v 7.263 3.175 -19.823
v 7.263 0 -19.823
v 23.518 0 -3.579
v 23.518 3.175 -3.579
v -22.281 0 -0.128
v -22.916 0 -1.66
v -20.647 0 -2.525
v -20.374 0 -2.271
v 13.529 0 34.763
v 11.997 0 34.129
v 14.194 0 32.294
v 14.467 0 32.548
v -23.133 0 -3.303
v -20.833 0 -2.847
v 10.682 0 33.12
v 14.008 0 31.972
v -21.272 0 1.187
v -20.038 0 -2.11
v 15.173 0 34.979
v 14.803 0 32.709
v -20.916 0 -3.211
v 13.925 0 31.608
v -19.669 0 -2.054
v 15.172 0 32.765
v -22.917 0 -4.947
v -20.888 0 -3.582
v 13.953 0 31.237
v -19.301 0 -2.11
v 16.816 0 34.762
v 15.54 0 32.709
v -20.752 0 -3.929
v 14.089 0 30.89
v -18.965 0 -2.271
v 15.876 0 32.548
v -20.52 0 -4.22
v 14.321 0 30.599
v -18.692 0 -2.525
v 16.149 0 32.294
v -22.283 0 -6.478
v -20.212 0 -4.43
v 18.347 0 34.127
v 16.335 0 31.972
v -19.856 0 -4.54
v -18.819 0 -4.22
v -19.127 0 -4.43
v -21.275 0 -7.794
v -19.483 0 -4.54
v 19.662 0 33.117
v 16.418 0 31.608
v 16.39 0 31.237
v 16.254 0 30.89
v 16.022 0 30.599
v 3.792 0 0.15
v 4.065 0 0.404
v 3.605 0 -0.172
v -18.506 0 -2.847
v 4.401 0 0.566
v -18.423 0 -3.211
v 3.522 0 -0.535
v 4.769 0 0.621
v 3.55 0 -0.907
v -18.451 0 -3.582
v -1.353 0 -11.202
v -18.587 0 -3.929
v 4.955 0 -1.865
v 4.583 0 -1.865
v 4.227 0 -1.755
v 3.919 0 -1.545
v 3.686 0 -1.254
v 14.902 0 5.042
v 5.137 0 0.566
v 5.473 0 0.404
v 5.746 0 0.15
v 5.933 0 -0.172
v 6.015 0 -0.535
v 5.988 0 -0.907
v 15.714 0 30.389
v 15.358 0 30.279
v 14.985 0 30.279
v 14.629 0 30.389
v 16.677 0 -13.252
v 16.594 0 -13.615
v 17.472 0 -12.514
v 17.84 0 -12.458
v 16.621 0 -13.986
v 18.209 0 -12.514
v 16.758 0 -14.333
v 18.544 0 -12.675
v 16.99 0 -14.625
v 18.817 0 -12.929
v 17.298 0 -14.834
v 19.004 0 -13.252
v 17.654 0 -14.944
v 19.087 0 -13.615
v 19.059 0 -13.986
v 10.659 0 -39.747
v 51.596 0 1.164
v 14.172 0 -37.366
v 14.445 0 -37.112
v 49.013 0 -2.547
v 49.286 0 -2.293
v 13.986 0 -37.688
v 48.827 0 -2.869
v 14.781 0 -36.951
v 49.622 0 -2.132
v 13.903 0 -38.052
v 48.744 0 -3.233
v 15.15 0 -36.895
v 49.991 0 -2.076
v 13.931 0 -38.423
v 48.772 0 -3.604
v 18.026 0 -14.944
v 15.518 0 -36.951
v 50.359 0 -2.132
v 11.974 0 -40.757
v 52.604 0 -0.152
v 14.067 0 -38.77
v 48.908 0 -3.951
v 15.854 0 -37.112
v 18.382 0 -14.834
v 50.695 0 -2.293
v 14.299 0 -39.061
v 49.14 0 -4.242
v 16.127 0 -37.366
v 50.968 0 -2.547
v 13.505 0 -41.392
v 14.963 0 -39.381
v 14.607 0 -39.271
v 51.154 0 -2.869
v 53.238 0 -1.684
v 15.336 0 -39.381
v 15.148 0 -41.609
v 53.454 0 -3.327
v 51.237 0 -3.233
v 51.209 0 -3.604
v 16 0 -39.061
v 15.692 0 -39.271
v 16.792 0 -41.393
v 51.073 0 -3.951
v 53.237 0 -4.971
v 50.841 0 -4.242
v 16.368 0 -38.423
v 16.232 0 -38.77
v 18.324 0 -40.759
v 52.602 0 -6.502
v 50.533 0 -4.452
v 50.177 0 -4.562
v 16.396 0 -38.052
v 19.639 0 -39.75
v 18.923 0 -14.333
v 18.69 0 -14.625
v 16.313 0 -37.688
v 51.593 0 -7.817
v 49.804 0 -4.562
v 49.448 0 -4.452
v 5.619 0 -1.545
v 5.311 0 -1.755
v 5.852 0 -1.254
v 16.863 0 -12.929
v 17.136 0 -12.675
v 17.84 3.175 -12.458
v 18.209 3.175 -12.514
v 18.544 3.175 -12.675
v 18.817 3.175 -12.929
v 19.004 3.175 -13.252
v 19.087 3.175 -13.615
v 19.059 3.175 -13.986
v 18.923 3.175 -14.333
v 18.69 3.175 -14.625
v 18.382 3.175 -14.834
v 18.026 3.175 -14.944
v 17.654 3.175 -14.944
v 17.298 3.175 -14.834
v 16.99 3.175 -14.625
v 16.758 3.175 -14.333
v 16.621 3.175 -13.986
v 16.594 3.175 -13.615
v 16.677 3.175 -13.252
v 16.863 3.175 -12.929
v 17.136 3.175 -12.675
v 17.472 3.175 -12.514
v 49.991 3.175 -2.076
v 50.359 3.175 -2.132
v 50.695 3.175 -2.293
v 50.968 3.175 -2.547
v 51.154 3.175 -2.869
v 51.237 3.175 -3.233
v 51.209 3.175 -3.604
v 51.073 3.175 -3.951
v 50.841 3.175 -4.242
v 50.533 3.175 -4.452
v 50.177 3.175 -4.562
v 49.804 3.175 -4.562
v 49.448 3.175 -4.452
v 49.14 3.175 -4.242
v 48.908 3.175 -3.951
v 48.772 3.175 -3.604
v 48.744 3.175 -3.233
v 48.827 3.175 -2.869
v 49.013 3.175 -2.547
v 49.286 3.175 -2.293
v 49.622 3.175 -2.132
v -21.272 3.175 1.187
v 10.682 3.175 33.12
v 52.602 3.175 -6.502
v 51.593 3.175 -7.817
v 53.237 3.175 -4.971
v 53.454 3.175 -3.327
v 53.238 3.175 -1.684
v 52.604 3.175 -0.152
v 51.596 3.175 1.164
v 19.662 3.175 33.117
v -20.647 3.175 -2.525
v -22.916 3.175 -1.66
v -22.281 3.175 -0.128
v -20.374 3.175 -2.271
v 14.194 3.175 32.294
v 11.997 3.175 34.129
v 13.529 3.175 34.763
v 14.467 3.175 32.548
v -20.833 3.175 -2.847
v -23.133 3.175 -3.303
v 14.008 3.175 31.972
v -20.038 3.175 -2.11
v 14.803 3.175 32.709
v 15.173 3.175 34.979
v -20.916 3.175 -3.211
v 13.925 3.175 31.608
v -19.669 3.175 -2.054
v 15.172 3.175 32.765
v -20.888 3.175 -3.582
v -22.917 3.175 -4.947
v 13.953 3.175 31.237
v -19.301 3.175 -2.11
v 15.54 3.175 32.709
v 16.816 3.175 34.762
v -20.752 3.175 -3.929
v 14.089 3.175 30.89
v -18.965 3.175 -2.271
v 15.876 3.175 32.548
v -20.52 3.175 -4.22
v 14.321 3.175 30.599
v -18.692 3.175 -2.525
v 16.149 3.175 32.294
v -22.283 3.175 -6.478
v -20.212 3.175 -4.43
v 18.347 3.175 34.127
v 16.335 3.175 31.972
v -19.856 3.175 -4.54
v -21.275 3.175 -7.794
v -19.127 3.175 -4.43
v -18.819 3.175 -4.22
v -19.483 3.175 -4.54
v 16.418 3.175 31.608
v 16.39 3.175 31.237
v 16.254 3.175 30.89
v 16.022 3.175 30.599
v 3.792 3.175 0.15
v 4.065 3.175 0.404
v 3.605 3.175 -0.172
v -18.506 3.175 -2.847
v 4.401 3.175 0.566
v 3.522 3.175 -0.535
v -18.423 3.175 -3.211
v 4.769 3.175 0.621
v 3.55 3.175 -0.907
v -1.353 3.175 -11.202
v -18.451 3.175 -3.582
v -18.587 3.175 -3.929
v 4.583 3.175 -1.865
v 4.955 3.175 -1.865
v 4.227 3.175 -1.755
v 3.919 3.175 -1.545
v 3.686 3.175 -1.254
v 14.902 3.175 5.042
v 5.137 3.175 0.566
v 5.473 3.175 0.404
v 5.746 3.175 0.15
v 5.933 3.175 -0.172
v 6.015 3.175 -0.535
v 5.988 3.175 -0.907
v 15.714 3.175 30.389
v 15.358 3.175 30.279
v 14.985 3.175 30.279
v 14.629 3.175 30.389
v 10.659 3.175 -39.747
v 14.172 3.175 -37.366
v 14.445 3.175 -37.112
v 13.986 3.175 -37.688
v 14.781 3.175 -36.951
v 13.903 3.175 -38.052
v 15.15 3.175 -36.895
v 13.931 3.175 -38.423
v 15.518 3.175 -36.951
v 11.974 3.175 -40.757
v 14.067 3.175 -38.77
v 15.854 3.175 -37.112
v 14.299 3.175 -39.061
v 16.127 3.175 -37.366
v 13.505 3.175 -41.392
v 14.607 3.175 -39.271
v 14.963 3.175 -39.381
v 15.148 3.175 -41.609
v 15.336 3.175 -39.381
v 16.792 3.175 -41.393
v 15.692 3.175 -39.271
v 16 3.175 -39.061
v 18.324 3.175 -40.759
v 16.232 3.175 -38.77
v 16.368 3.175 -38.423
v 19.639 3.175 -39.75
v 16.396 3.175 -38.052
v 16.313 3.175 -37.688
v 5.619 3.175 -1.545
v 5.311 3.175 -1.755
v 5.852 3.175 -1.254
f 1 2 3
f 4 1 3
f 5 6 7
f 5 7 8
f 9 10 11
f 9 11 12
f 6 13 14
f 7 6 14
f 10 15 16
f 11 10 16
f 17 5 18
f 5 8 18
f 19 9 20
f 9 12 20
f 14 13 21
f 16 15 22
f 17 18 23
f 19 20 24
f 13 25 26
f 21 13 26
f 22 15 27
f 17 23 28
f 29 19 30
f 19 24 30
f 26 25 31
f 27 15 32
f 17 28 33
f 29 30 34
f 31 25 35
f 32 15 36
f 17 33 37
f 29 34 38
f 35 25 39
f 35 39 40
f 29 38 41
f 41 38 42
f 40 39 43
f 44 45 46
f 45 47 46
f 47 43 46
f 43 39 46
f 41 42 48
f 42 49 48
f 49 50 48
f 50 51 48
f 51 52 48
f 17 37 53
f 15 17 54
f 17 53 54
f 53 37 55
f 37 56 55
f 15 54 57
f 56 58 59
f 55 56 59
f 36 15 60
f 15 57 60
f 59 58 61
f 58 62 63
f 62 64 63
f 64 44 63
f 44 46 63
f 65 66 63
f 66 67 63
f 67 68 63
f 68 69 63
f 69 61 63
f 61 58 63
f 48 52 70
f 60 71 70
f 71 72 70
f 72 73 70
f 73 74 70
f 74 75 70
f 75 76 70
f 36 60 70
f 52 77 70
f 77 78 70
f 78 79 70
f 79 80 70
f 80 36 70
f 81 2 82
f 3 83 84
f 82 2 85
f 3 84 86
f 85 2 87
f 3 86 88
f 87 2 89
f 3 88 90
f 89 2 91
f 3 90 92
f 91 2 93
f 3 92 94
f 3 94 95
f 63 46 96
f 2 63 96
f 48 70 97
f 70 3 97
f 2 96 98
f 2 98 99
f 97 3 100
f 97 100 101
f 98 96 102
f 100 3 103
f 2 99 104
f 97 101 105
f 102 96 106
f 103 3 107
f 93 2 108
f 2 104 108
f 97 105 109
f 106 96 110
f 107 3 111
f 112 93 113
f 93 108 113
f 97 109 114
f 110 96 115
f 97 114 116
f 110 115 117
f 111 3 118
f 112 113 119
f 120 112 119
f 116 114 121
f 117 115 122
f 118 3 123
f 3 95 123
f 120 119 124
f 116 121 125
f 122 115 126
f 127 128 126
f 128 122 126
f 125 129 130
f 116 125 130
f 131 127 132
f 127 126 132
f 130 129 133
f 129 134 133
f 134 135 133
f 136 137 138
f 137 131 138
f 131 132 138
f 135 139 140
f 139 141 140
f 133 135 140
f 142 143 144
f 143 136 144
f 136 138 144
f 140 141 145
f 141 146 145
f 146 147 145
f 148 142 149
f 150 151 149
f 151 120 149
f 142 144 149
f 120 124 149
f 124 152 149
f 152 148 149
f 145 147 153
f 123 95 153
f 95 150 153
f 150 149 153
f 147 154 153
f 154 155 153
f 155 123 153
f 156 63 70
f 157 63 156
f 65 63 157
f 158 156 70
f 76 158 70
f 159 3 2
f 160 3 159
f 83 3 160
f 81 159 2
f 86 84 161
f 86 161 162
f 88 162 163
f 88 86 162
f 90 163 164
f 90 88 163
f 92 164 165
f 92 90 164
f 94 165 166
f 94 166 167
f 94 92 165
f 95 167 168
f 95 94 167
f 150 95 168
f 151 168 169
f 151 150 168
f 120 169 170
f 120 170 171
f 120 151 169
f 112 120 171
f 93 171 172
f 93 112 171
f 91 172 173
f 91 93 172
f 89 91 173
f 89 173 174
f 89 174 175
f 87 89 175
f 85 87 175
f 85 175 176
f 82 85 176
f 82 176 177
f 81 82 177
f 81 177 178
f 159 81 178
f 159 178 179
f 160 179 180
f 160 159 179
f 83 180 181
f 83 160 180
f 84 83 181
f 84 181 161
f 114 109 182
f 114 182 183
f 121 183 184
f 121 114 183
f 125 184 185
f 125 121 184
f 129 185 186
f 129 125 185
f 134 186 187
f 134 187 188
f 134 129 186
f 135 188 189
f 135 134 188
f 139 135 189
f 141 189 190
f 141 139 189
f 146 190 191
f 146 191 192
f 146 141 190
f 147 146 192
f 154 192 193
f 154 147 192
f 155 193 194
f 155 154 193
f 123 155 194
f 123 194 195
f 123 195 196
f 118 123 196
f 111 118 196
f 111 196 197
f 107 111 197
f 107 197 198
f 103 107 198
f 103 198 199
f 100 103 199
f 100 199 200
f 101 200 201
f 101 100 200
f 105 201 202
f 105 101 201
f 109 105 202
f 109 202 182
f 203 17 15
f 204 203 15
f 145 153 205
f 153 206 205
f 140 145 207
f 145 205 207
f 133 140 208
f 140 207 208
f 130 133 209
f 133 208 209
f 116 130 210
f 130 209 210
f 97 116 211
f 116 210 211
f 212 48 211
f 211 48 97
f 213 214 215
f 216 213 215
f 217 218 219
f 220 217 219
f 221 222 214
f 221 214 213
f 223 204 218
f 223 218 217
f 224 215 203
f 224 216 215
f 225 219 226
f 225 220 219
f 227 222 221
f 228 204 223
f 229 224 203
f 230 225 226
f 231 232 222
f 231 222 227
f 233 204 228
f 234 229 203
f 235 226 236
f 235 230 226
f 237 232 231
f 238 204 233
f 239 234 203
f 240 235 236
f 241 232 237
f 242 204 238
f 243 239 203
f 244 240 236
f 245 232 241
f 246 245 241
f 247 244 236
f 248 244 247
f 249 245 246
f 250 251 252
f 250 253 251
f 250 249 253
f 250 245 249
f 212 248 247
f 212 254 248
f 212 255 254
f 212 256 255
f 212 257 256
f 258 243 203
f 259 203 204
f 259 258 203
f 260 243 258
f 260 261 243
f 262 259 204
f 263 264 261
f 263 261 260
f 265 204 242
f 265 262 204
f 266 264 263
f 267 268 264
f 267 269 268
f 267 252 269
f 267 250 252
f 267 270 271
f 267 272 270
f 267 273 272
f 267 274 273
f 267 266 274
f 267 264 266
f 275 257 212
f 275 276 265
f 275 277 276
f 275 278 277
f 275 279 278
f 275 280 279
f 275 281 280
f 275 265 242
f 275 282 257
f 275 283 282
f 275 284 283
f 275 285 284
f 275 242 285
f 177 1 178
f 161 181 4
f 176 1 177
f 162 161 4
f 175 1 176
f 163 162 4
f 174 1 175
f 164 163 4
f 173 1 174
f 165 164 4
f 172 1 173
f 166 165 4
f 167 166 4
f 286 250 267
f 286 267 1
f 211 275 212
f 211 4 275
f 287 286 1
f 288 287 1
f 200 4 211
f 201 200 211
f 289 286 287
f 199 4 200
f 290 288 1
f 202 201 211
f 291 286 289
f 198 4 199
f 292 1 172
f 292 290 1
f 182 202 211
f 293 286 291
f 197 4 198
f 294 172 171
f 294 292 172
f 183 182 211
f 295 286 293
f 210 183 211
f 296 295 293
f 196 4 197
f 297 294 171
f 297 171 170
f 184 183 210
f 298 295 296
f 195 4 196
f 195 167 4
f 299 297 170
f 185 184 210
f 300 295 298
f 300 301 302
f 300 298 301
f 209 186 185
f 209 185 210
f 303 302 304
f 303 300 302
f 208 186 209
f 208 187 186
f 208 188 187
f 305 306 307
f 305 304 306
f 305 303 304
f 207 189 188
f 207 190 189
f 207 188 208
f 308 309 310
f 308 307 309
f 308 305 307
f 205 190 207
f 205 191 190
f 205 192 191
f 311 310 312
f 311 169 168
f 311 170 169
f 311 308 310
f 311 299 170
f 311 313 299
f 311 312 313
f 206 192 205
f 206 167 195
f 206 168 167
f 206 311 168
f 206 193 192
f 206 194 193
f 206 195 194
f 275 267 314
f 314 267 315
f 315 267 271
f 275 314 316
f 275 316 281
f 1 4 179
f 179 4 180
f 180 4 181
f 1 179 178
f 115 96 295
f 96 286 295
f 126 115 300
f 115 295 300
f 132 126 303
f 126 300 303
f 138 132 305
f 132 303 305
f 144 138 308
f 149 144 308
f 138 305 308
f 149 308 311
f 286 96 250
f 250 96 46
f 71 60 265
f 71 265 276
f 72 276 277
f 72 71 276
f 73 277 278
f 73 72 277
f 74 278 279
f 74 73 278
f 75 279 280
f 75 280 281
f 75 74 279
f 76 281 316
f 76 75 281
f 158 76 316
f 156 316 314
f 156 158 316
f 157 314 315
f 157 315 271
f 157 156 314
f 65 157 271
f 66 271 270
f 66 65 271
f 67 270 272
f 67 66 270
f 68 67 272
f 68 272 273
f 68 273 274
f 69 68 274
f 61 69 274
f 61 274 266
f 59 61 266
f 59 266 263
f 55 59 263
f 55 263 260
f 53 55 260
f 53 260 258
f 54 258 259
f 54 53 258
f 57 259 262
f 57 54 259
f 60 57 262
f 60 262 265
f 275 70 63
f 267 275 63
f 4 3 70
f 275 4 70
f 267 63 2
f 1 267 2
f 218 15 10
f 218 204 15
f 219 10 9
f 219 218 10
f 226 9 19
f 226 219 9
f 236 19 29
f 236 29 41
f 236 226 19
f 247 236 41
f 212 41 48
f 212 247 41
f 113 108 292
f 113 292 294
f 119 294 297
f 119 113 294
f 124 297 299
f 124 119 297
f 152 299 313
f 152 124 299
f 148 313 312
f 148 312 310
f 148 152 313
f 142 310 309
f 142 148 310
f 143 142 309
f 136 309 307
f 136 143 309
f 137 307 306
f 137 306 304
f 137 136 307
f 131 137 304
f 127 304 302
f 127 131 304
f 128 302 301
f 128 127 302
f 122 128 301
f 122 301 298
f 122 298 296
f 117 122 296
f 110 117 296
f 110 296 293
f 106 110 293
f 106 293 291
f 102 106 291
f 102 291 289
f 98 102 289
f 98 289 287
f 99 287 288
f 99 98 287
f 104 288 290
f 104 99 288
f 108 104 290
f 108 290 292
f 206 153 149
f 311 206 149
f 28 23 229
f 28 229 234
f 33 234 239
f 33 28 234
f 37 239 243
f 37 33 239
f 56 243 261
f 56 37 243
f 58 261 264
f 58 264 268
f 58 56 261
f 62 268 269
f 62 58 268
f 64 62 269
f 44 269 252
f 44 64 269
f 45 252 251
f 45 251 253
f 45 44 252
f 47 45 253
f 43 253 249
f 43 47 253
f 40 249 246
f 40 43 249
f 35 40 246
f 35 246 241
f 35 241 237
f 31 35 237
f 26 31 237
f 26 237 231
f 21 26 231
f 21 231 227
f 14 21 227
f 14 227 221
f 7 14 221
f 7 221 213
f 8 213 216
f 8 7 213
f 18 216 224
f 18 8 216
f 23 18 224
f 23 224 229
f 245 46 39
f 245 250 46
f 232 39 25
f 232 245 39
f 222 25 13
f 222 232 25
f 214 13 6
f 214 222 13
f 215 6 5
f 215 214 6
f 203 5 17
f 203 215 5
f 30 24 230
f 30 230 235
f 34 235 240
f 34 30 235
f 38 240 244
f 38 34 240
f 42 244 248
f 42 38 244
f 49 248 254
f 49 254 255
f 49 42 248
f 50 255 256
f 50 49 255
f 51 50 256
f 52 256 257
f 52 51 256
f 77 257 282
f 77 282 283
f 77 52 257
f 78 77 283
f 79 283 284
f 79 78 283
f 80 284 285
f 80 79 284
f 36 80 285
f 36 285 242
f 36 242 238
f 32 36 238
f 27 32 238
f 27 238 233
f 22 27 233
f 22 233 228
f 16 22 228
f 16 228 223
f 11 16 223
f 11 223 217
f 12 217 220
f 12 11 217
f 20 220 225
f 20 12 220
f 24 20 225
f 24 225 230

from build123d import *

# Parameters (mm, degrees)
SKETCH1_R           = 1.25
BOSS_EXTRUDE1_DEPTH = 3.175
FILLET1_R           = 6.35


with BuildPart() as part:
    # Sketch1 → Boss-Extrude1 (new body)
    with BuildSketch(Plane(origin=(0, 0, 0), x_dir=(1, 0, 0), z_dir=(0, 1, 0))):
        Polygon((15.147658291, 44.238817403), (-25.76324473, 3.302114568), (15.173458104, -37.608788453), (56.084361126, 3.327914382), align=None)
        with Locations(Location((17.840116094, 13.708278644, 0), (0, 0, 270))):
            Circle(SKETCH1_R, mode=Mode.SUBTRACT)
        with Locations(Location((4.768985382, 0.628904831, 0), (0, 0, 270))):
            Circle(SKETCH1_R, mode=Mode.SUBTRACT)
        with Locations(Location((-19.669398793, 3.304035457, 0), (0, 0, 270))):
            Circle(SKETCH1_R, mode=Mode.SUBTRACT)
        with Locations(Location((15.149579179, 38.144971466, 0), (0, 0, 270))):
            Circle(SKETCH1_R, mode=Mode.SUBTRACT)
        with Locations(Location((49.990509247, 3.325999432, 0), (0, 0, 270))):
            Circle(SKETCH1_R, mode=Mode.SUBTRACT)
        with Locations(Location((15.171537216, -31.514942515, 0), (0, 0, 270))):
            Circle(SKETCH1_R, mode=Mode.SUBTRACT)
        Polygon((14.901563134, -5.042362692), (-1.352871962, 11.201828262), (7.263335329, 19.823469227), (23.517770424, 3.579278273), align=None, mode=Mode.SUBTRACT)
    extrude(amount=BOSS_EXTRUDE1_DEPTH)

    # Fillet1
    fillet1_edges = [part.edges().sort_by_distance(p)[0] for p in [
        (-25.76324473, 1.5875, -3.302114568),
        (15.147658291, 1.5875, -44.238817403),
        (56.084361126, 1.5875, -3.327914382),
        (15.173458104, 1.5875, 37.608788453),
    ]]
    fillet(fillet1_edges, radius=FILLET1_R)


solid = part.part
